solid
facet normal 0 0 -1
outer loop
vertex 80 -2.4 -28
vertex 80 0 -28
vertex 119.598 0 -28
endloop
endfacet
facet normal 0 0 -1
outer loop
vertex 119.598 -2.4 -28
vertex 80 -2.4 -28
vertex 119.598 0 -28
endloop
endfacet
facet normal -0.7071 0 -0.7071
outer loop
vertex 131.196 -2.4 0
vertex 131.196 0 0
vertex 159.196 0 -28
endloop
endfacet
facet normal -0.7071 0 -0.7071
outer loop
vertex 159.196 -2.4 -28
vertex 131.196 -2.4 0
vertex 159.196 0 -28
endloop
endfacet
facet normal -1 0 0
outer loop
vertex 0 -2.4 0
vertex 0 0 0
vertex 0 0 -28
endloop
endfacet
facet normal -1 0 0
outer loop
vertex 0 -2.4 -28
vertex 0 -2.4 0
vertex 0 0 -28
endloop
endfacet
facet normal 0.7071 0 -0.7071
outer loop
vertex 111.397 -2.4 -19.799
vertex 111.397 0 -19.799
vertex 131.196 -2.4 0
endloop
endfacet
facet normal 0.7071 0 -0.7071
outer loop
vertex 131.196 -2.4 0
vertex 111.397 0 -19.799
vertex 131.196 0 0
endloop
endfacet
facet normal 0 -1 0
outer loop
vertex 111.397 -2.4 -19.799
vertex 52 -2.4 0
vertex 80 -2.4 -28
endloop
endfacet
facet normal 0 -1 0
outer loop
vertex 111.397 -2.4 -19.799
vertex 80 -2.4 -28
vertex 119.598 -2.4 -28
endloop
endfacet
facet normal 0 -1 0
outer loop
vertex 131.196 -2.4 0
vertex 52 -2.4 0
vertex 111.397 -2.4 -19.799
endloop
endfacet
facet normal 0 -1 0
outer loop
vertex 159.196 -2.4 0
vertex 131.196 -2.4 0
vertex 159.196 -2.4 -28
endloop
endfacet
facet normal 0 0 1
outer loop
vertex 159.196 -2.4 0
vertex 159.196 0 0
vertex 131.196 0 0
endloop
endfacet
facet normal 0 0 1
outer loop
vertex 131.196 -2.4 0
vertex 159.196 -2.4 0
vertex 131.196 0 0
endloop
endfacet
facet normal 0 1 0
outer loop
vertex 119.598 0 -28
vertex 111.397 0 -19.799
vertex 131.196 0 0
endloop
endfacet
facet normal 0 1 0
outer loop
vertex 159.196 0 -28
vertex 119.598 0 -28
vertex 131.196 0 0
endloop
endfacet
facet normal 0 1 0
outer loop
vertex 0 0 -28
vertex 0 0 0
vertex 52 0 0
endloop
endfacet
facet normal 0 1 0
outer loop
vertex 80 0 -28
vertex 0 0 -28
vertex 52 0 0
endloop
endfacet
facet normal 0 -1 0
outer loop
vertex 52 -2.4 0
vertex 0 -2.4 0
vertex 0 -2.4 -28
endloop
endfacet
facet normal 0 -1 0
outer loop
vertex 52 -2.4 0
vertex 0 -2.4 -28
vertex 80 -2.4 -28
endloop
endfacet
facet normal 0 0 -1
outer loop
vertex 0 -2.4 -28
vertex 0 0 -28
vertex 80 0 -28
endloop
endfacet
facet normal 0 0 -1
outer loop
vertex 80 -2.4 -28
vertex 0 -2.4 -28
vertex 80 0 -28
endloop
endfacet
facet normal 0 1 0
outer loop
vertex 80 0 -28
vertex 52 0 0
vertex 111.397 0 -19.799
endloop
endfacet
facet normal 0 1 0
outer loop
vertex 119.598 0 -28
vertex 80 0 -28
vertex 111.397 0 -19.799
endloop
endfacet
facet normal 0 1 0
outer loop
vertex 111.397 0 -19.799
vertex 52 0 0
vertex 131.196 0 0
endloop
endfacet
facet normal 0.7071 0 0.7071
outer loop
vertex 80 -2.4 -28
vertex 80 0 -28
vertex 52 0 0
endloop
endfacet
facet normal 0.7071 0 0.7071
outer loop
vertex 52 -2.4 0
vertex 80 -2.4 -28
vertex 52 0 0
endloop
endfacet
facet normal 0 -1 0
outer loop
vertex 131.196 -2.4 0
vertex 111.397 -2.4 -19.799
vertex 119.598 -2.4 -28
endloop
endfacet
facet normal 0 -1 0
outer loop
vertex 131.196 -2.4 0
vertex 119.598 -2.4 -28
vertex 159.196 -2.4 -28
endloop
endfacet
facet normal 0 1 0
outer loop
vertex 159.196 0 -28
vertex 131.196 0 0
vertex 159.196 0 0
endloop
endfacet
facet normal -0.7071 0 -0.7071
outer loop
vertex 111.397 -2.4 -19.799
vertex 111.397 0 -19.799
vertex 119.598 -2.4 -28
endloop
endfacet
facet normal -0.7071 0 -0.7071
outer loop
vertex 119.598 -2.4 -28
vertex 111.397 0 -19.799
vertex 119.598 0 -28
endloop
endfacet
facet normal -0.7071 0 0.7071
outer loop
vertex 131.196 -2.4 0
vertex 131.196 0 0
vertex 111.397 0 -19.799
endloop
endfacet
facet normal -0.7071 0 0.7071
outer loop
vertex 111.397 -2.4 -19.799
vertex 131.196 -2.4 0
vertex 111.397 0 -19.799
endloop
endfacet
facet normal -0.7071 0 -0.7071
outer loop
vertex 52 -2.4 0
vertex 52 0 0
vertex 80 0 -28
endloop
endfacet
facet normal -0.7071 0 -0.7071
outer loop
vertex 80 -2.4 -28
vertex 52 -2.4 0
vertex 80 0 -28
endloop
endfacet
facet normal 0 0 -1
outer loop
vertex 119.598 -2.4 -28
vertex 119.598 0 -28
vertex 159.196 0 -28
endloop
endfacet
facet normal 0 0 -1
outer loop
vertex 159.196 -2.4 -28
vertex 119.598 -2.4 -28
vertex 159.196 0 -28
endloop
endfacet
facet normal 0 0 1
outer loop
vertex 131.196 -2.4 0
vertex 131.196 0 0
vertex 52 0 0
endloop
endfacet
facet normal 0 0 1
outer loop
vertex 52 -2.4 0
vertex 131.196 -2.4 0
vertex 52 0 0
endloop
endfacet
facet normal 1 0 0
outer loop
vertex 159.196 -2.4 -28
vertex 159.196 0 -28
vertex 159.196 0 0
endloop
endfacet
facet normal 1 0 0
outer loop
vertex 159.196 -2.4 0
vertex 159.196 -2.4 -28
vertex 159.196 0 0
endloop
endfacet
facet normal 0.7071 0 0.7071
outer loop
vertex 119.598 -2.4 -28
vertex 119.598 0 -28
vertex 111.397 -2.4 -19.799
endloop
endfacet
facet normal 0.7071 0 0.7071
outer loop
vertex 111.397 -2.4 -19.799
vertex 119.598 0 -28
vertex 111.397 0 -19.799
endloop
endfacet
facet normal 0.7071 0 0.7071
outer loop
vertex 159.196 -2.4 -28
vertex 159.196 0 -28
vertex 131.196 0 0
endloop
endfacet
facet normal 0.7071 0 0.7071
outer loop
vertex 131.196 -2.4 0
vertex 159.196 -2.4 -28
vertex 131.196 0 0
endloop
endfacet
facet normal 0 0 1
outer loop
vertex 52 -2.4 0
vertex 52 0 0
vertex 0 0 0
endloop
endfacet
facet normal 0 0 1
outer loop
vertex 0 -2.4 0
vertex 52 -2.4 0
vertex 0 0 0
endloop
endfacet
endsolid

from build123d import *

# Parameters (mm, degrees)
F2_DEPTH = 2.4
F3_DEPTH = 2.4


with BuildPart() as f2:
    # F1 (on Front) → F2 (new body)
    with BuildSketch(Plane.XZ):
        Polygon((52, 0), (0, 0), (0, -28), (80, -28), align=None)
    extrude(amount=F2_DEPTH)


with BuildPart() as f2b:
    # F1 (on Front) → F2, piece 2 (new body)
    with BuildSketch(Plane.XZ):
        Polygon((159.1959594929, -28), (131.1959594929, 0), (111.3969696197, -19.7989898732), (119.5979797464, -28), align=None)
    extrude(amount=F2_DEPTH)


with BuildPart() as f3:
    # F1 (on Front) → F3 (new body)
    with BuildSketch(Plane.XZ):
        Polygon((131.1959594929, 0), (52, 0), (80, -28), (119.5979797464, -28), (111.3969696197, -19.7989898732), align=None)
    extrude(amount=F3_DEPTH)


with BuildPart() as f3b:
    # F1 (on Front) → F3, piece 2 (new body)
    with BuildSketch(Plane.XZ):
        Polygon((159.1959594929, 0), (131.1959594929, 0), (159.1959594929, -28), align=None)
    extrude(amount=F3_DEPTH)


solid = Compound([f2.part, f2b.part, f3.part, f3b.part])
